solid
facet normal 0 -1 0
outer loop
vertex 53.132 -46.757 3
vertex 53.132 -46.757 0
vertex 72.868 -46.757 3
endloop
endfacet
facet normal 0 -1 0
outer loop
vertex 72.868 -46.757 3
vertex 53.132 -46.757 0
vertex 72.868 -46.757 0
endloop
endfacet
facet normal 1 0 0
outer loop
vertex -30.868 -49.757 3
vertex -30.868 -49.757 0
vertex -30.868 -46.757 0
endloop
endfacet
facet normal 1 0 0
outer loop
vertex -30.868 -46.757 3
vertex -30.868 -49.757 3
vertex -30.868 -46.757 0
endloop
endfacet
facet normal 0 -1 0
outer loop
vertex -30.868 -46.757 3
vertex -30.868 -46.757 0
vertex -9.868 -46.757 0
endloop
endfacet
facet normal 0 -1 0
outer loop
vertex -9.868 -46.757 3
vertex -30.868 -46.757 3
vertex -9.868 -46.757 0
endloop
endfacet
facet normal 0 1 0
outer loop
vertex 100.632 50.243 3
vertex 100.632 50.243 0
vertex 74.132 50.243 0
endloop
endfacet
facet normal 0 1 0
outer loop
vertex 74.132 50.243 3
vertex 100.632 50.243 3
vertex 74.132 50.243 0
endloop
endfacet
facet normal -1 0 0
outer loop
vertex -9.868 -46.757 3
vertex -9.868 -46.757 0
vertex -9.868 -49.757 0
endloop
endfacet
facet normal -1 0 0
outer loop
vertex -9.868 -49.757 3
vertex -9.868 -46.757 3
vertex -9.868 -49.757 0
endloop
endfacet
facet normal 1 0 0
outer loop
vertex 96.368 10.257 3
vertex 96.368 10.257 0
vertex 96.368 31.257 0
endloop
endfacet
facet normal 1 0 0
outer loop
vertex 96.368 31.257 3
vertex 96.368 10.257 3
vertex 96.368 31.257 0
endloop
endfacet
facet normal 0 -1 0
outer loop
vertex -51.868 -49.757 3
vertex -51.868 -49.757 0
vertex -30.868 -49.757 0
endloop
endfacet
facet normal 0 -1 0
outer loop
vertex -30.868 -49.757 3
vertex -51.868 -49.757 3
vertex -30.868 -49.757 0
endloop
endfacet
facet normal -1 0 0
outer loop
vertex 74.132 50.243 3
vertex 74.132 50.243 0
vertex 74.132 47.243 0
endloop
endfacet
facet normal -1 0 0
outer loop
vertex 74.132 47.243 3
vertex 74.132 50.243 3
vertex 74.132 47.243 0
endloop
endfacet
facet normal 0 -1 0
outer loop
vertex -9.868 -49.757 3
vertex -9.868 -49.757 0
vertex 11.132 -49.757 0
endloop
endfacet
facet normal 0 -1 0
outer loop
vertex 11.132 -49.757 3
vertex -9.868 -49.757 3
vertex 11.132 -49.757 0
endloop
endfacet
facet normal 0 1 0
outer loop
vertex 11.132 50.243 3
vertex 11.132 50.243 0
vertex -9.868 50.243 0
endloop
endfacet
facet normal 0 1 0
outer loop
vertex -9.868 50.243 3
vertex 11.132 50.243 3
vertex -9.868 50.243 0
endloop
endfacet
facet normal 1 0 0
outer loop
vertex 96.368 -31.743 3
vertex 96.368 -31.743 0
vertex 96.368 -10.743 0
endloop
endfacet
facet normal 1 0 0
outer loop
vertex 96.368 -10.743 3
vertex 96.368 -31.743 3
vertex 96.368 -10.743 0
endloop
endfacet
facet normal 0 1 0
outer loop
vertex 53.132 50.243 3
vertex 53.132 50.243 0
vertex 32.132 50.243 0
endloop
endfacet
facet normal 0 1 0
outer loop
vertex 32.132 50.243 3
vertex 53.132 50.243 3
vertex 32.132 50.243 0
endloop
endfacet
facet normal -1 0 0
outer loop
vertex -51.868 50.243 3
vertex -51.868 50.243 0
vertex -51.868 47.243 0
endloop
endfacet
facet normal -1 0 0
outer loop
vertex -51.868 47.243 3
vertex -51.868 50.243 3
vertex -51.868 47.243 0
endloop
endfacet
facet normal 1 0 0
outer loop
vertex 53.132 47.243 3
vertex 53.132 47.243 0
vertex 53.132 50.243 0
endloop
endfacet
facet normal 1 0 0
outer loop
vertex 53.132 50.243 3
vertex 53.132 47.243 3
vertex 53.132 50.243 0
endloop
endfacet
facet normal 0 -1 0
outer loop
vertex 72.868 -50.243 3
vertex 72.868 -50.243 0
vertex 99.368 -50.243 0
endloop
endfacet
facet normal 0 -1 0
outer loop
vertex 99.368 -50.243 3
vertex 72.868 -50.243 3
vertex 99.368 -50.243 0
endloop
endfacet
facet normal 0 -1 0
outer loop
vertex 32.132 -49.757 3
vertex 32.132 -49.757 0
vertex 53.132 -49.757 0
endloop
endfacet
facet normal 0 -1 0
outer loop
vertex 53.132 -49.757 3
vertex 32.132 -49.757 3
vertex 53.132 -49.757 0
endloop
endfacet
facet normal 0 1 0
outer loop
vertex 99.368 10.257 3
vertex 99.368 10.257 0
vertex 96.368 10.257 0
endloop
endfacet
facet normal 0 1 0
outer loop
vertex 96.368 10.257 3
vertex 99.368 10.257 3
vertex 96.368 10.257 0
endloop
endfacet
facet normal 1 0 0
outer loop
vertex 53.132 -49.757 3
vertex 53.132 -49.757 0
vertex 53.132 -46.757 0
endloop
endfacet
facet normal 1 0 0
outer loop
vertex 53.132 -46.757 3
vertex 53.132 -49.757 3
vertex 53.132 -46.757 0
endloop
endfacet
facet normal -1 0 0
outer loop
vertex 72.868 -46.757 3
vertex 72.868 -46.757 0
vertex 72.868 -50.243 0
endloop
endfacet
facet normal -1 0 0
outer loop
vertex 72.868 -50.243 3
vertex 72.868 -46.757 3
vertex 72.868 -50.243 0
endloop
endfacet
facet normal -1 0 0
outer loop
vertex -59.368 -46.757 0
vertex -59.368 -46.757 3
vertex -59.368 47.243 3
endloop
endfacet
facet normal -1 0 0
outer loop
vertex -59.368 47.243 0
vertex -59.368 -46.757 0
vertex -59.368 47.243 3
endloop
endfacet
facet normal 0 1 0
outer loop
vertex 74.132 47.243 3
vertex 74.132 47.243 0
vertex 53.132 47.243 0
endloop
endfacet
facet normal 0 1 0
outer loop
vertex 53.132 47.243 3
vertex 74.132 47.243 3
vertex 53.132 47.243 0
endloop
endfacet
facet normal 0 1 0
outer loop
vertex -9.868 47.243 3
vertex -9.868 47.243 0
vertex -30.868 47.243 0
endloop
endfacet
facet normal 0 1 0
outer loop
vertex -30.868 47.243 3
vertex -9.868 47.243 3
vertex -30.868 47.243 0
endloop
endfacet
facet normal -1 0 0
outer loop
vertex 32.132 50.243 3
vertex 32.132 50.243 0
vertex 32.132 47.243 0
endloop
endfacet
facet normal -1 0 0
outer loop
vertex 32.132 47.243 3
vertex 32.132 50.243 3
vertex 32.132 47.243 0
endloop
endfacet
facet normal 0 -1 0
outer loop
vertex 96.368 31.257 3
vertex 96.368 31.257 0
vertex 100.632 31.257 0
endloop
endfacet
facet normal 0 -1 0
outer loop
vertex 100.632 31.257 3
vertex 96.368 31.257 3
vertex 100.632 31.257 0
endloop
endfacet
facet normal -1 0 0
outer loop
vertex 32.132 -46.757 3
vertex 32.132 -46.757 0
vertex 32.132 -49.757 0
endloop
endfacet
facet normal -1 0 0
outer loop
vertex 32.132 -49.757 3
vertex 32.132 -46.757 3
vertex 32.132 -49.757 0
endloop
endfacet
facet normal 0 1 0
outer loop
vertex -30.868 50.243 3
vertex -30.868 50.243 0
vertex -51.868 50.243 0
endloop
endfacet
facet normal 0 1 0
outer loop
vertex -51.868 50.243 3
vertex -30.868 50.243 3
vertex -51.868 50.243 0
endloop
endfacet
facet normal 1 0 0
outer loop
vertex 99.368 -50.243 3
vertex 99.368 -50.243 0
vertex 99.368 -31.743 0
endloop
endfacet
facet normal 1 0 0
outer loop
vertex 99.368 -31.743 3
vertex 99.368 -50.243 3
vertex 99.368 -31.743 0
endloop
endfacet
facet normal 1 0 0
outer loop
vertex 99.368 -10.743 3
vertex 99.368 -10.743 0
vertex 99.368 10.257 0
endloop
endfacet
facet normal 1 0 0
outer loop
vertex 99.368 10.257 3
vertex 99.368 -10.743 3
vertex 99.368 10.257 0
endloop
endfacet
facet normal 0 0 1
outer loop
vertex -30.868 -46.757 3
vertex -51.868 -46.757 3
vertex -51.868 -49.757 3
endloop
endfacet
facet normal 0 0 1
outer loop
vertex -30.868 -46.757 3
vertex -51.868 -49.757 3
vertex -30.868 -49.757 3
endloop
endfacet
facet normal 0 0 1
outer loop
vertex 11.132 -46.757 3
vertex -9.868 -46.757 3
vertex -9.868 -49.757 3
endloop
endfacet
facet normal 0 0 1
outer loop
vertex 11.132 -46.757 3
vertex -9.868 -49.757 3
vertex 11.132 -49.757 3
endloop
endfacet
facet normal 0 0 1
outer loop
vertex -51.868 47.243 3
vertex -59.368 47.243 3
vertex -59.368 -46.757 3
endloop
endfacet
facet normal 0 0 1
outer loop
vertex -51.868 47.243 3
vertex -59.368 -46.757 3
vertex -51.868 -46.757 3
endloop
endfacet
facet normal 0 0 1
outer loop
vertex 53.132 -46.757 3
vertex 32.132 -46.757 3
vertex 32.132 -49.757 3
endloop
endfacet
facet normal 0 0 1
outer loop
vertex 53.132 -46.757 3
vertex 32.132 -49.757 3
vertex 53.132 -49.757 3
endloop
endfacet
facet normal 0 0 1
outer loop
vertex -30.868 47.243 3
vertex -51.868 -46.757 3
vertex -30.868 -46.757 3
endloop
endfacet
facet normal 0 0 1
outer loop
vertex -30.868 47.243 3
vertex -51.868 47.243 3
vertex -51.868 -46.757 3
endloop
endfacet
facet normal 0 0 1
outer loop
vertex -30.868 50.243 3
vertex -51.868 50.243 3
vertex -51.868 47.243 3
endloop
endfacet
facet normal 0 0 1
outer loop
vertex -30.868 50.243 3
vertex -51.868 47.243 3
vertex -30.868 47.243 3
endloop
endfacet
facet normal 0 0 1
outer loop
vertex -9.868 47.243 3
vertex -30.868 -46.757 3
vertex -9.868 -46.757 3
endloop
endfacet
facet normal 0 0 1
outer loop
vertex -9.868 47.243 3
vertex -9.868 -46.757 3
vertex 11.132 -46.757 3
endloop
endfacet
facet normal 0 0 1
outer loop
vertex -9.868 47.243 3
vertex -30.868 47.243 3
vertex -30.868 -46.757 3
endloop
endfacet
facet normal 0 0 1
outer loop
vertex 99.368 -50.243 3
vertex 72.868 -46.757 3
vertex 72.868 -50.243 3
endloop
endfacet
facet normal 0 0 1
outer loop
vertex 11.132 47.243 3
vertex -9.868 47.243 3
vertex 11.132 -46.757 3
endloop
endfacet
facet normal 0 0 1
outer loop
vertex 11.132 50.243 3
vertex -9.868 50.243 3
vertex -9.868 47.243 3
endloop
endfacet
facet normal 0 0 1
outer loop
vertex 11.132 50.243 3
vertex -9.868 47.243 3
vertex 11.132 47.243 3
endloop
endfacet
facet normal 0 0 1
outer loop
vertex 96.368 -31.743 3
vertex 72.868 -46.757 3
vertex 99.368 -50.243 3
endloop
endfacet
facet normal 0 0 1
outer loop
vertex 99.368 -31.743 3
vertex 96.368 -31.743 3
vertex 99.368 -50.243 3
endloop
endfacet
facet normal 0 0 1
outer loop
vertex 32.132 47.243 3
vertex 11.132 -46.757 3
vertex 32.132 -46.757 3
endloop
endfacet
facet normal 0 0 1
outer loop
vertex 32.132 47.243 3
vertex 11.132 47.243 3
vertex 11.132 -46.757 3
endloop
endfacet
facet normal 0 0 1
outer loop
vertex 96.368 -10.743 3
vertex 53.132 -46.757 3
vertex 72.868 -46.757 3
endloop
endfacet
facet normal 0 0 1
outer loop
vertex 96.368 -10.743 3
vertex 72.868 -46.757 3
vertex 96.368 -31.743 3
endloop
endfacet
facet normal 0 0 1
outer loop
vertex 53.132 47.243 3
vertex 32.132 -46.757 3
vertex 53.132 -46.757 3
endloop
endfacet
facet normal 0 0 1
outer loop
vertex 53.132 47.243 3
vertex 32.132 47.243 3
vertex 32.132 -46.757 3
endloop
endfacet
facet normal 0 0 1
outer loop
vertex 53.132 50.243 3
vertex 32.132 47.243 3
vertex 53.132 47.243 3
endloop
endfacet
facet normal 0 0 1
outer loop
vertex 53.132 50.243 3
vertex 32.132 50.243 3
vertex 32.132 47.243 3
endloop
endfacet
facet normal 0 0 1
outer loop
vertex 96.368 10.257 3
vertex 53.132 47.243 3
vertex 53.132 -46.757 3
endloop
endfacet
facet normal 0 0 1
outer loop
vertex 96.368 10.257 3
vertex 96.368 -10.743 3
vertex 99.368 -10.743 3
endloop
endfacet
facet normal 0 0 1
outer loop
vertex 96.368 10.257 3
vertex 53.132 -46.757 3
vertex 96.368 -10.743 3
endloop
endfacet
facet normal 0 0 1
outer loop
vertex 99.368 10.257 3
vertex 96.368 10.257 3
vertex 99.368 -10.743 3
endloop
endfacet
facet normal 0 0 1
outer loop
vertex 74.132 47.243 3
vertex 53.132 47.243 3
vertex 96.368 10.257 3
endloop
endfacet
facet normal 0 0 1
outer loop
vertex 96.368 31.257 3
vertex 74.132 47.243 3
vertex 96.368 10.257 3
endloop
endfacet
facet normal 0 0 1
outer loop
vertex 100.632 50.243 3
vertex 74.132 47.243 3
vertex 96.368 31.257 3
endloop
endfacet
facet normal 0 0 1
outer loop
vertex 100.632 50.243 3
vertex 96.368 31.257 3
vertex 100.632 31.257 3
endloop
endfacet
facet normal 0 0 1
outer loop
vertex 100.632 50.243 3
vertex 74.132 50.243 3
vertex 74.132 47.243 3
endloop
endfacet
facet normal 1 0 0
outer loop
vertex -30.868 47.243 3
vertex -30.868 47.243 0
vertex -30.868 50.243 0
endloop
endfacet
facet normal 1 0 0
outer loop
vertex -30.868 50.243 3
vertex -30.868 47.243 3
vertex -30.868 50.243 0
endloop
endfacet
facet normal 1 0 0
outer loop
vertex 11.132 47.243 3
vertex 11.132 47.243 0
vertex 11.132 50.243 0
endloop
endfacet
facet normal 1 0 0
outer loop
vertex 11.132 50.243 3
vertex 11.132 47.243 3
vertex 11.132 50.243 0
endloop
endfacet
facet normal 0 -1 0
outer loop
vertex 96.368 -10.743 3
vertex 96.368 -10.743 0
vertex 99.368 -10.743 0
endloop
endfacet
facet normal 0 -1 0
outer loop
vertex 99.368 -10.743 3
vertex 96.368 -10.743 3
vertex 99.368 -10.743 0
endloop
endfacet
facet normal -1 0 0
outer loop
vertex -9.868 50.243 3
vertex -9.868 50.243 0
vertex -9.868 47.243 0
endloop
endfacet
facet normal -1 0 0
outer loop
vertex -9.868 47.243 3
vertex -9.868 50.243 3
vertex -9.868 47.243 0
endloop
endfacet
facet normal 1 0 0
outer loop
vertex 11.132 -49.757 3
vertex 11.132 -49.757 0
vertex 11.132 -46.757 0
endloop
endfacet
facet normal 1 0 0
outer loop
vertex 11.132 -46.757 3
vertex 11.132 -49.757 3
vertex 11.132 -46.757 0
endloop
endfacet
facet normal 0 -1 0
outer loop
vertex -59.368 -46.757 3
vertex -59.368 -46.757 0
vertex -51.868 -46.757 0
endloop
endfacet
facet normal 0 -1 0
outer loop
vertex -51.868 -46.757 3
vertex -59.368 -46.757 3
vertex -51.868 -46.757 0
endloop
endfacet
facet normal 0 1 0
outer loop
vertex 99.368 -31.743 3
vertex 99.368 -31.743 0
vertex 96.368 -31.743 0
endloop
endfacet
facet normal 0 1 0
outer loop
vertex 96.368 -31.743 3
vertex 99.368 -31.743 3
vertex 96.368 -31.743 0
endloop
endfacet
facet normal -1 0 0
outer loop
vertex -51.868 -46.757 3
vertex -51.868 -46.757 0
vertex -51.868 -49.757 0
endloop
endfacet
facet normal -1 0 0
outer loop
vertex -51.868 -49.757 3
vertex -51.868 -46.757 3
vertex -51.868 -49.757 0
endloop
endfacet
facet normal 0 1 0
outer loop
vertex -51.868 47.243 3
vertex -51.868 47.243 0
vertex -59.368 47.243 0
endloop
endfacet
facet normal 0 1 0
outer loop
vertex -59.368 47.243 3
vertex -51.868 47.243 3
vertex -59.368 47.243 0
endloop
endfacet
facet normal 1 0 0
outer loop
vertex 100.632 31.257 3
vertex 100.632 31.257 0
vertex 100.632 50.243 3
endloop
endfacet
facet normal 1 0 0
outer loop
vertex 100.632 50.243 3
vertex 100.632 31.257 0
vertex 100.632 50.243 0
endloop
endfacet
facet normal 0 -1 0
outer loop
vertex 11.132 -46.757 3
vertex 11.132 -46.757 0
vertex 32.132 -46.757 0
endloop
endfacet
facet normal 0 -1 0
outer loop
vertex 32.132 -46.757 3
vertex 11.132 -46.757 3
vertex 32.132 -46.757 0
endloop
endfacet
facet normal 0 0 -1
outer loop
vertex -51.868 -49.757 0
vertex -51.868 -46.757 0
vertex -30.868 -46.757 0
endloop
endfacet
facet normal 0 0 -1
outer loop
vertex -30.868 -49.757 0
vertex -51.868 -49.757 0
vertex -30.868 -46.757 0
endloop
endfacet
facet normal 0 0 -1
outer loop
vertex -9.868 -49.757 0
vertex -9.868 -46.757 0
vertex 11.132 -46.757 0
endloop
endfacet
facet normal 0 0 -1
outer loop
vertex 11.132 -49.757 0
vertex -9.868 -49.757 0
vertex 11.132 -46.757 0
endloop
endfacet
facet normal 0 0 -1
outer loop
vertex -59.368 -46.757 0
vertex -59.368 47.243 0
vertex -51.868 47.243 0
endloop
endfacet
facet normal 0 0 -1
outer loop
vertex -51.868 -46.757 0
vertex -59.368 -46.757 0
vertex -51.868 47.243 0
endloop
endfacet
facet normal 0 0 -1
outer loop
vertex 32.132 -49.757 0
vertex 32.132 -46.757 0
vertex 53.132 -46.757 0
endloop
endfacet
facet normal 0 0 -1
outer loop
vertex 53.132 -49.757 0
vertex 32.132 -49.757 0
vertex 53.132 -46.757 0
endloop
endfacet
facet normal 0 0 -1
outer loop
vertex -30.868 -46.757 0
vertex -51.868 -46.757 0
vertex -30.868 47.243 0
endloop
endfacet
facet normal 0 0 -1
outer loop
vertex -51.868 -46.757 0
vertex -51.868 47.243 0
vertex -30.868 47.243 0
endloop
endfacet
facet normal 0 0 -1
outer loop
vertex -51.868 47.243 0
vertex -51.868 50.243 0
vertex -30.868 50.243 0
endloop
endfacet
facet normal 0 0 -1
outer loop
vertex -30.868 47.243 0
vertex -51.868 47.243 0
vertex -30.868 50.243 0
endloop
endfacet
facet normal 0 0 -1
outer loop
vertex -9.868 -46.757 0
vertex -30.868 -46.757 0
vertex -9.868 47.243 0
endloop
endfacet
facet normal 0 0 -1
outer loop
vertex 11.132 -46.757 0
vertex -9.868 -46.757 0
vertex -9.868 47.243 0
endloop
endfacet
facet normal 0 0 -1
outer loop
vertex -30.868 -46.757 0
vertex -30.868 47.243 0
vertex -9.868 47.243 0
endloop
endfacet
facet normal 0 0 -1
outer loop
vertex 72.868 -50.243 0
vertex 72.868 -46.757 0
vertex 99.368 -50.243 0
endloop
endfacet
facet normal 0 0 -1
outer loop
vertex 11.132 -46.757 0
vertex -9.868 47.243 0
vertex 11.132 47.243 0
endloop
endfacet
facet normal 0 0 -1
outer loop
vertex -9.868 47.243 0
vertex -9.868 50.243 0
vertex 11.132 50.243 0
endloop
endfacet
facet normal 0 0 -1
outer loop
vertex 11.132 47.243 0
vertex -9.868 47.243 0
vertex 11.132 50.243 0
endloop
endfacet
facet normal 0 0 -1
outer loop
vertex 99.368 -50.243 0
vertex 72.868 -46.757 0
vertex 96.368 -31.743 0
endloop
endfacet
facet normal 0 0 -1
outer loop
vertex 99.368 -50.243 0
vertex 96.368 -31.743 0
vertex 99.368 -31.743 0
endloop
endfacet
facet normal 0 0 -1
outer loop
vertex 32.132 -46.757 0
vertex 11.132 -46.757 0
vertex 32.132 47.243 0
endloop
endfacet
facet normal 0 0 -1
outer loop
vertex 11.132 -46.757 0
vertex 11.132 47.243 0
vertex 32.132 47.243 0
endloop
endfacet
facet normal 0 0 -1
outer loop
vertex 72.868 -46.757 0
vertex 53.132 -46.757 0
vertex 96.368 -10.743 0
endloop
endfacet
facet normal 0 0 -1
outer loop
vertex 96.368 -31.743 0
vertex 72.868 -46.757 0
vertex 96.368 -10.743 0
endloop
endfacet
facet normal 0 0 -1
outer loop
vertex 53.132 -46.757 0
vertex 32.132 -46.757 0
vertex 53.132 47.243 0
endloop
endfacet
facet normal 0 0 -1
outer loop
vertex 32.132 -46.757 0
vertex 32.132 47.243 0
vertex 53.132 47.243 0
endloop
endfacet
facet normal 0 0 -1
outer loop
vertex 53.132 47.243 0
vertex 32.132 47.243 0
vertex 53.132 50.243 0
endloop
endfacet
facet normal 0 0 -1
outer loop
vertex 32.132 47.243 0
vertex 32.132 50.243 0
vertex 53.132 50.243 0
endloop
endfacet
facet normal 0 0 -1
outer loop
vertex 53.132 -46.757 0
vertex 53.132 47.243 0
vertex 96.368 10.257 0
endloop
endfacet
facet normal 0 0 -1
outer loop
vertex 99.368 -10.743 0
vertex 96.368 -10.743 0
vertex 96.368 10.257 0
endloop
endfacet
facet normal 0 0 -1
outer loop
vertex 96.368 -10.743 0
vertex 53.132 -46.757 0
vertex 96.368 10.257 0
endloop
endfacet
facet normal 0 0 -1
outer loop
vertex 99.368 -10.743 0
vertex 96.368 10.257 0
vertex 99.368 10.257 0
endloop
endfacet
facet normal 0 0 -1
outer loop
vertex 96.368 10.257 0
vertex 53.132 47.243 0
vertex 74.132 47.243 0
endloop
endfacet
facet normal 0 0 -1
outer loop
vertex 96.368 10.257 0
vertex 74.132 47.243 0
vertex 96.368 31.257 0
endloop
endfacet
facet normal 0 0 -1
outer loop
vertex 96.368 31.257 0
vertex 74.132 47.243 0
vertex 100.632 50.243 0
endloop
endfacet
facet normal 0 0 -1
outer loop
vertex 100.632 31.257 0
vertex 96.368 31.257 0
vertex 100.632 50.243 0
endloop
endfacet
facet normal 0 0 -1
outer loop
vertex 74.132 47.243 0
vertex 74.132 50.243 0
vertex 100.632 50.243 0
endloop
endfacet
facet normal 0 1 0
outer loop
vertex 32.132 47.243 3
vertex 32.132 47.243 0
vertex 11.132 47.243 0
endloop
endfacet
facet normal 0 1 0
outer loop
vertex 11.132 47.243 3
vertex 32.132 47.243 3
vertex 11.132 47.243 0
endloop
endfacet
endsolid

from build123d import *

# Parameters (mm, degrees)
SALIENTE_EXTRUIR1_DEPTH = 3
CORTAR_EXTRUIR3_DEPTH   = 10


with BuildPart() as part:
    # Croquis1 → Saliente-Extruir1 (new body)
    with BuildSketch(Plane.XY):
        Polygon((-99.368109251, 50.24258427), (-99.368109251, 31.74258427), (-96.368109251, 31.74258427), (-96.368109251, 10.74258427), (-99.368109251, 10.74258427), (-99.368109251, -10.25741573), (-96.368109251, -10.25741573), (-96.368109251, -31.25741573), (-99.368109251, -31.25741573), (-99.368109251, -49.75741573), (-72.868109251, -49.75741573), (-72.868109251, -46.75741573), (-51.868109251, -46.75741573), (-51.868109251, -49.75741573), (-30.868109251, -49.75741573), (-30.868109251, -46.75741573), (-9.868109251, -46.75741573), (-9.868109251, -49.75741573), (11.131890749, -49.75741573), (11.131890749, -46.75741573), (32.131890749, -46.75741573), (32.131890749, -49.75741573), (53.131890749, -49.75741573), (53.131890749, -46.75741573), (72.868109251, -46.75741573), (72.868109251, -50.24258427), (93.868109251, -50.24258427), (99.368109251, -50.24258427), (99.368109251, -31.74258427), (96.368109251, -31.74258427), (96.368109251, -10.74258427), (99.368109251, -10.74258427), (99.368109251, 10.25741573), (96.368109251, 10.25741573), (96.368109251, 31.25741573), (100.631890749, 31.25741573), (100.631890749, 50.24258427), (74.131890749, 50.24258427), (74.131890749, 47.24258427), (53.131890749, 47.24258427), (53.131890749, 50.24258427), (32.131890749, 50.24258427), (32.131890749, 47.24258427), (11.131890749, 47.24258427), (11.131890749, 50.24258427), (-9.868109251, 50.24258427), (-9.868109251, 47.24258427), (-30.868109251, 47.24258427), (-30.868109251, 50.24258427), (-51.868109251, 50.24258427), (-51.868109251, 47.24258427), (-72.868109251, 47.24258427), (-72.868109251, 50.24258427), (-93.868109251, 50.24258427), align=None)
    extrude(amount=SALIENTE_EXTRUIR1_DEPTH)

    # Croquis2 → Cortar-Extruir3 (cut)
    with BuildSketch(Plane.XY.offset(3)):
        Polygon((-72.868109251, 50.24258427), (-99.368109251, 50.24258427), (-99.368109251, 31.74258427), (-96.368109251, 31.74258427), (-96.368109251, 10.74258427), (-99.368109251, 10.74258427), (-99.368109251, -10.25741573), (-96.368109251, -10.25741573), (-96.368109251, -31.25741573), (-99.368109251, -31.25741573), (-99.368109251, -49.75741573), (-72.868109251, -49.75741573), (-72.868109251, -46.75741573), (-59.368109251, -46.75741573), (-59.368109251, 47.24258427), (-72.868109251, 47.24258427), align=None)
    extrude(amount=-CORTAR_EXTRUIR3_DEPTH, mode=Mode.SUBTRACT)


solid = part.part
